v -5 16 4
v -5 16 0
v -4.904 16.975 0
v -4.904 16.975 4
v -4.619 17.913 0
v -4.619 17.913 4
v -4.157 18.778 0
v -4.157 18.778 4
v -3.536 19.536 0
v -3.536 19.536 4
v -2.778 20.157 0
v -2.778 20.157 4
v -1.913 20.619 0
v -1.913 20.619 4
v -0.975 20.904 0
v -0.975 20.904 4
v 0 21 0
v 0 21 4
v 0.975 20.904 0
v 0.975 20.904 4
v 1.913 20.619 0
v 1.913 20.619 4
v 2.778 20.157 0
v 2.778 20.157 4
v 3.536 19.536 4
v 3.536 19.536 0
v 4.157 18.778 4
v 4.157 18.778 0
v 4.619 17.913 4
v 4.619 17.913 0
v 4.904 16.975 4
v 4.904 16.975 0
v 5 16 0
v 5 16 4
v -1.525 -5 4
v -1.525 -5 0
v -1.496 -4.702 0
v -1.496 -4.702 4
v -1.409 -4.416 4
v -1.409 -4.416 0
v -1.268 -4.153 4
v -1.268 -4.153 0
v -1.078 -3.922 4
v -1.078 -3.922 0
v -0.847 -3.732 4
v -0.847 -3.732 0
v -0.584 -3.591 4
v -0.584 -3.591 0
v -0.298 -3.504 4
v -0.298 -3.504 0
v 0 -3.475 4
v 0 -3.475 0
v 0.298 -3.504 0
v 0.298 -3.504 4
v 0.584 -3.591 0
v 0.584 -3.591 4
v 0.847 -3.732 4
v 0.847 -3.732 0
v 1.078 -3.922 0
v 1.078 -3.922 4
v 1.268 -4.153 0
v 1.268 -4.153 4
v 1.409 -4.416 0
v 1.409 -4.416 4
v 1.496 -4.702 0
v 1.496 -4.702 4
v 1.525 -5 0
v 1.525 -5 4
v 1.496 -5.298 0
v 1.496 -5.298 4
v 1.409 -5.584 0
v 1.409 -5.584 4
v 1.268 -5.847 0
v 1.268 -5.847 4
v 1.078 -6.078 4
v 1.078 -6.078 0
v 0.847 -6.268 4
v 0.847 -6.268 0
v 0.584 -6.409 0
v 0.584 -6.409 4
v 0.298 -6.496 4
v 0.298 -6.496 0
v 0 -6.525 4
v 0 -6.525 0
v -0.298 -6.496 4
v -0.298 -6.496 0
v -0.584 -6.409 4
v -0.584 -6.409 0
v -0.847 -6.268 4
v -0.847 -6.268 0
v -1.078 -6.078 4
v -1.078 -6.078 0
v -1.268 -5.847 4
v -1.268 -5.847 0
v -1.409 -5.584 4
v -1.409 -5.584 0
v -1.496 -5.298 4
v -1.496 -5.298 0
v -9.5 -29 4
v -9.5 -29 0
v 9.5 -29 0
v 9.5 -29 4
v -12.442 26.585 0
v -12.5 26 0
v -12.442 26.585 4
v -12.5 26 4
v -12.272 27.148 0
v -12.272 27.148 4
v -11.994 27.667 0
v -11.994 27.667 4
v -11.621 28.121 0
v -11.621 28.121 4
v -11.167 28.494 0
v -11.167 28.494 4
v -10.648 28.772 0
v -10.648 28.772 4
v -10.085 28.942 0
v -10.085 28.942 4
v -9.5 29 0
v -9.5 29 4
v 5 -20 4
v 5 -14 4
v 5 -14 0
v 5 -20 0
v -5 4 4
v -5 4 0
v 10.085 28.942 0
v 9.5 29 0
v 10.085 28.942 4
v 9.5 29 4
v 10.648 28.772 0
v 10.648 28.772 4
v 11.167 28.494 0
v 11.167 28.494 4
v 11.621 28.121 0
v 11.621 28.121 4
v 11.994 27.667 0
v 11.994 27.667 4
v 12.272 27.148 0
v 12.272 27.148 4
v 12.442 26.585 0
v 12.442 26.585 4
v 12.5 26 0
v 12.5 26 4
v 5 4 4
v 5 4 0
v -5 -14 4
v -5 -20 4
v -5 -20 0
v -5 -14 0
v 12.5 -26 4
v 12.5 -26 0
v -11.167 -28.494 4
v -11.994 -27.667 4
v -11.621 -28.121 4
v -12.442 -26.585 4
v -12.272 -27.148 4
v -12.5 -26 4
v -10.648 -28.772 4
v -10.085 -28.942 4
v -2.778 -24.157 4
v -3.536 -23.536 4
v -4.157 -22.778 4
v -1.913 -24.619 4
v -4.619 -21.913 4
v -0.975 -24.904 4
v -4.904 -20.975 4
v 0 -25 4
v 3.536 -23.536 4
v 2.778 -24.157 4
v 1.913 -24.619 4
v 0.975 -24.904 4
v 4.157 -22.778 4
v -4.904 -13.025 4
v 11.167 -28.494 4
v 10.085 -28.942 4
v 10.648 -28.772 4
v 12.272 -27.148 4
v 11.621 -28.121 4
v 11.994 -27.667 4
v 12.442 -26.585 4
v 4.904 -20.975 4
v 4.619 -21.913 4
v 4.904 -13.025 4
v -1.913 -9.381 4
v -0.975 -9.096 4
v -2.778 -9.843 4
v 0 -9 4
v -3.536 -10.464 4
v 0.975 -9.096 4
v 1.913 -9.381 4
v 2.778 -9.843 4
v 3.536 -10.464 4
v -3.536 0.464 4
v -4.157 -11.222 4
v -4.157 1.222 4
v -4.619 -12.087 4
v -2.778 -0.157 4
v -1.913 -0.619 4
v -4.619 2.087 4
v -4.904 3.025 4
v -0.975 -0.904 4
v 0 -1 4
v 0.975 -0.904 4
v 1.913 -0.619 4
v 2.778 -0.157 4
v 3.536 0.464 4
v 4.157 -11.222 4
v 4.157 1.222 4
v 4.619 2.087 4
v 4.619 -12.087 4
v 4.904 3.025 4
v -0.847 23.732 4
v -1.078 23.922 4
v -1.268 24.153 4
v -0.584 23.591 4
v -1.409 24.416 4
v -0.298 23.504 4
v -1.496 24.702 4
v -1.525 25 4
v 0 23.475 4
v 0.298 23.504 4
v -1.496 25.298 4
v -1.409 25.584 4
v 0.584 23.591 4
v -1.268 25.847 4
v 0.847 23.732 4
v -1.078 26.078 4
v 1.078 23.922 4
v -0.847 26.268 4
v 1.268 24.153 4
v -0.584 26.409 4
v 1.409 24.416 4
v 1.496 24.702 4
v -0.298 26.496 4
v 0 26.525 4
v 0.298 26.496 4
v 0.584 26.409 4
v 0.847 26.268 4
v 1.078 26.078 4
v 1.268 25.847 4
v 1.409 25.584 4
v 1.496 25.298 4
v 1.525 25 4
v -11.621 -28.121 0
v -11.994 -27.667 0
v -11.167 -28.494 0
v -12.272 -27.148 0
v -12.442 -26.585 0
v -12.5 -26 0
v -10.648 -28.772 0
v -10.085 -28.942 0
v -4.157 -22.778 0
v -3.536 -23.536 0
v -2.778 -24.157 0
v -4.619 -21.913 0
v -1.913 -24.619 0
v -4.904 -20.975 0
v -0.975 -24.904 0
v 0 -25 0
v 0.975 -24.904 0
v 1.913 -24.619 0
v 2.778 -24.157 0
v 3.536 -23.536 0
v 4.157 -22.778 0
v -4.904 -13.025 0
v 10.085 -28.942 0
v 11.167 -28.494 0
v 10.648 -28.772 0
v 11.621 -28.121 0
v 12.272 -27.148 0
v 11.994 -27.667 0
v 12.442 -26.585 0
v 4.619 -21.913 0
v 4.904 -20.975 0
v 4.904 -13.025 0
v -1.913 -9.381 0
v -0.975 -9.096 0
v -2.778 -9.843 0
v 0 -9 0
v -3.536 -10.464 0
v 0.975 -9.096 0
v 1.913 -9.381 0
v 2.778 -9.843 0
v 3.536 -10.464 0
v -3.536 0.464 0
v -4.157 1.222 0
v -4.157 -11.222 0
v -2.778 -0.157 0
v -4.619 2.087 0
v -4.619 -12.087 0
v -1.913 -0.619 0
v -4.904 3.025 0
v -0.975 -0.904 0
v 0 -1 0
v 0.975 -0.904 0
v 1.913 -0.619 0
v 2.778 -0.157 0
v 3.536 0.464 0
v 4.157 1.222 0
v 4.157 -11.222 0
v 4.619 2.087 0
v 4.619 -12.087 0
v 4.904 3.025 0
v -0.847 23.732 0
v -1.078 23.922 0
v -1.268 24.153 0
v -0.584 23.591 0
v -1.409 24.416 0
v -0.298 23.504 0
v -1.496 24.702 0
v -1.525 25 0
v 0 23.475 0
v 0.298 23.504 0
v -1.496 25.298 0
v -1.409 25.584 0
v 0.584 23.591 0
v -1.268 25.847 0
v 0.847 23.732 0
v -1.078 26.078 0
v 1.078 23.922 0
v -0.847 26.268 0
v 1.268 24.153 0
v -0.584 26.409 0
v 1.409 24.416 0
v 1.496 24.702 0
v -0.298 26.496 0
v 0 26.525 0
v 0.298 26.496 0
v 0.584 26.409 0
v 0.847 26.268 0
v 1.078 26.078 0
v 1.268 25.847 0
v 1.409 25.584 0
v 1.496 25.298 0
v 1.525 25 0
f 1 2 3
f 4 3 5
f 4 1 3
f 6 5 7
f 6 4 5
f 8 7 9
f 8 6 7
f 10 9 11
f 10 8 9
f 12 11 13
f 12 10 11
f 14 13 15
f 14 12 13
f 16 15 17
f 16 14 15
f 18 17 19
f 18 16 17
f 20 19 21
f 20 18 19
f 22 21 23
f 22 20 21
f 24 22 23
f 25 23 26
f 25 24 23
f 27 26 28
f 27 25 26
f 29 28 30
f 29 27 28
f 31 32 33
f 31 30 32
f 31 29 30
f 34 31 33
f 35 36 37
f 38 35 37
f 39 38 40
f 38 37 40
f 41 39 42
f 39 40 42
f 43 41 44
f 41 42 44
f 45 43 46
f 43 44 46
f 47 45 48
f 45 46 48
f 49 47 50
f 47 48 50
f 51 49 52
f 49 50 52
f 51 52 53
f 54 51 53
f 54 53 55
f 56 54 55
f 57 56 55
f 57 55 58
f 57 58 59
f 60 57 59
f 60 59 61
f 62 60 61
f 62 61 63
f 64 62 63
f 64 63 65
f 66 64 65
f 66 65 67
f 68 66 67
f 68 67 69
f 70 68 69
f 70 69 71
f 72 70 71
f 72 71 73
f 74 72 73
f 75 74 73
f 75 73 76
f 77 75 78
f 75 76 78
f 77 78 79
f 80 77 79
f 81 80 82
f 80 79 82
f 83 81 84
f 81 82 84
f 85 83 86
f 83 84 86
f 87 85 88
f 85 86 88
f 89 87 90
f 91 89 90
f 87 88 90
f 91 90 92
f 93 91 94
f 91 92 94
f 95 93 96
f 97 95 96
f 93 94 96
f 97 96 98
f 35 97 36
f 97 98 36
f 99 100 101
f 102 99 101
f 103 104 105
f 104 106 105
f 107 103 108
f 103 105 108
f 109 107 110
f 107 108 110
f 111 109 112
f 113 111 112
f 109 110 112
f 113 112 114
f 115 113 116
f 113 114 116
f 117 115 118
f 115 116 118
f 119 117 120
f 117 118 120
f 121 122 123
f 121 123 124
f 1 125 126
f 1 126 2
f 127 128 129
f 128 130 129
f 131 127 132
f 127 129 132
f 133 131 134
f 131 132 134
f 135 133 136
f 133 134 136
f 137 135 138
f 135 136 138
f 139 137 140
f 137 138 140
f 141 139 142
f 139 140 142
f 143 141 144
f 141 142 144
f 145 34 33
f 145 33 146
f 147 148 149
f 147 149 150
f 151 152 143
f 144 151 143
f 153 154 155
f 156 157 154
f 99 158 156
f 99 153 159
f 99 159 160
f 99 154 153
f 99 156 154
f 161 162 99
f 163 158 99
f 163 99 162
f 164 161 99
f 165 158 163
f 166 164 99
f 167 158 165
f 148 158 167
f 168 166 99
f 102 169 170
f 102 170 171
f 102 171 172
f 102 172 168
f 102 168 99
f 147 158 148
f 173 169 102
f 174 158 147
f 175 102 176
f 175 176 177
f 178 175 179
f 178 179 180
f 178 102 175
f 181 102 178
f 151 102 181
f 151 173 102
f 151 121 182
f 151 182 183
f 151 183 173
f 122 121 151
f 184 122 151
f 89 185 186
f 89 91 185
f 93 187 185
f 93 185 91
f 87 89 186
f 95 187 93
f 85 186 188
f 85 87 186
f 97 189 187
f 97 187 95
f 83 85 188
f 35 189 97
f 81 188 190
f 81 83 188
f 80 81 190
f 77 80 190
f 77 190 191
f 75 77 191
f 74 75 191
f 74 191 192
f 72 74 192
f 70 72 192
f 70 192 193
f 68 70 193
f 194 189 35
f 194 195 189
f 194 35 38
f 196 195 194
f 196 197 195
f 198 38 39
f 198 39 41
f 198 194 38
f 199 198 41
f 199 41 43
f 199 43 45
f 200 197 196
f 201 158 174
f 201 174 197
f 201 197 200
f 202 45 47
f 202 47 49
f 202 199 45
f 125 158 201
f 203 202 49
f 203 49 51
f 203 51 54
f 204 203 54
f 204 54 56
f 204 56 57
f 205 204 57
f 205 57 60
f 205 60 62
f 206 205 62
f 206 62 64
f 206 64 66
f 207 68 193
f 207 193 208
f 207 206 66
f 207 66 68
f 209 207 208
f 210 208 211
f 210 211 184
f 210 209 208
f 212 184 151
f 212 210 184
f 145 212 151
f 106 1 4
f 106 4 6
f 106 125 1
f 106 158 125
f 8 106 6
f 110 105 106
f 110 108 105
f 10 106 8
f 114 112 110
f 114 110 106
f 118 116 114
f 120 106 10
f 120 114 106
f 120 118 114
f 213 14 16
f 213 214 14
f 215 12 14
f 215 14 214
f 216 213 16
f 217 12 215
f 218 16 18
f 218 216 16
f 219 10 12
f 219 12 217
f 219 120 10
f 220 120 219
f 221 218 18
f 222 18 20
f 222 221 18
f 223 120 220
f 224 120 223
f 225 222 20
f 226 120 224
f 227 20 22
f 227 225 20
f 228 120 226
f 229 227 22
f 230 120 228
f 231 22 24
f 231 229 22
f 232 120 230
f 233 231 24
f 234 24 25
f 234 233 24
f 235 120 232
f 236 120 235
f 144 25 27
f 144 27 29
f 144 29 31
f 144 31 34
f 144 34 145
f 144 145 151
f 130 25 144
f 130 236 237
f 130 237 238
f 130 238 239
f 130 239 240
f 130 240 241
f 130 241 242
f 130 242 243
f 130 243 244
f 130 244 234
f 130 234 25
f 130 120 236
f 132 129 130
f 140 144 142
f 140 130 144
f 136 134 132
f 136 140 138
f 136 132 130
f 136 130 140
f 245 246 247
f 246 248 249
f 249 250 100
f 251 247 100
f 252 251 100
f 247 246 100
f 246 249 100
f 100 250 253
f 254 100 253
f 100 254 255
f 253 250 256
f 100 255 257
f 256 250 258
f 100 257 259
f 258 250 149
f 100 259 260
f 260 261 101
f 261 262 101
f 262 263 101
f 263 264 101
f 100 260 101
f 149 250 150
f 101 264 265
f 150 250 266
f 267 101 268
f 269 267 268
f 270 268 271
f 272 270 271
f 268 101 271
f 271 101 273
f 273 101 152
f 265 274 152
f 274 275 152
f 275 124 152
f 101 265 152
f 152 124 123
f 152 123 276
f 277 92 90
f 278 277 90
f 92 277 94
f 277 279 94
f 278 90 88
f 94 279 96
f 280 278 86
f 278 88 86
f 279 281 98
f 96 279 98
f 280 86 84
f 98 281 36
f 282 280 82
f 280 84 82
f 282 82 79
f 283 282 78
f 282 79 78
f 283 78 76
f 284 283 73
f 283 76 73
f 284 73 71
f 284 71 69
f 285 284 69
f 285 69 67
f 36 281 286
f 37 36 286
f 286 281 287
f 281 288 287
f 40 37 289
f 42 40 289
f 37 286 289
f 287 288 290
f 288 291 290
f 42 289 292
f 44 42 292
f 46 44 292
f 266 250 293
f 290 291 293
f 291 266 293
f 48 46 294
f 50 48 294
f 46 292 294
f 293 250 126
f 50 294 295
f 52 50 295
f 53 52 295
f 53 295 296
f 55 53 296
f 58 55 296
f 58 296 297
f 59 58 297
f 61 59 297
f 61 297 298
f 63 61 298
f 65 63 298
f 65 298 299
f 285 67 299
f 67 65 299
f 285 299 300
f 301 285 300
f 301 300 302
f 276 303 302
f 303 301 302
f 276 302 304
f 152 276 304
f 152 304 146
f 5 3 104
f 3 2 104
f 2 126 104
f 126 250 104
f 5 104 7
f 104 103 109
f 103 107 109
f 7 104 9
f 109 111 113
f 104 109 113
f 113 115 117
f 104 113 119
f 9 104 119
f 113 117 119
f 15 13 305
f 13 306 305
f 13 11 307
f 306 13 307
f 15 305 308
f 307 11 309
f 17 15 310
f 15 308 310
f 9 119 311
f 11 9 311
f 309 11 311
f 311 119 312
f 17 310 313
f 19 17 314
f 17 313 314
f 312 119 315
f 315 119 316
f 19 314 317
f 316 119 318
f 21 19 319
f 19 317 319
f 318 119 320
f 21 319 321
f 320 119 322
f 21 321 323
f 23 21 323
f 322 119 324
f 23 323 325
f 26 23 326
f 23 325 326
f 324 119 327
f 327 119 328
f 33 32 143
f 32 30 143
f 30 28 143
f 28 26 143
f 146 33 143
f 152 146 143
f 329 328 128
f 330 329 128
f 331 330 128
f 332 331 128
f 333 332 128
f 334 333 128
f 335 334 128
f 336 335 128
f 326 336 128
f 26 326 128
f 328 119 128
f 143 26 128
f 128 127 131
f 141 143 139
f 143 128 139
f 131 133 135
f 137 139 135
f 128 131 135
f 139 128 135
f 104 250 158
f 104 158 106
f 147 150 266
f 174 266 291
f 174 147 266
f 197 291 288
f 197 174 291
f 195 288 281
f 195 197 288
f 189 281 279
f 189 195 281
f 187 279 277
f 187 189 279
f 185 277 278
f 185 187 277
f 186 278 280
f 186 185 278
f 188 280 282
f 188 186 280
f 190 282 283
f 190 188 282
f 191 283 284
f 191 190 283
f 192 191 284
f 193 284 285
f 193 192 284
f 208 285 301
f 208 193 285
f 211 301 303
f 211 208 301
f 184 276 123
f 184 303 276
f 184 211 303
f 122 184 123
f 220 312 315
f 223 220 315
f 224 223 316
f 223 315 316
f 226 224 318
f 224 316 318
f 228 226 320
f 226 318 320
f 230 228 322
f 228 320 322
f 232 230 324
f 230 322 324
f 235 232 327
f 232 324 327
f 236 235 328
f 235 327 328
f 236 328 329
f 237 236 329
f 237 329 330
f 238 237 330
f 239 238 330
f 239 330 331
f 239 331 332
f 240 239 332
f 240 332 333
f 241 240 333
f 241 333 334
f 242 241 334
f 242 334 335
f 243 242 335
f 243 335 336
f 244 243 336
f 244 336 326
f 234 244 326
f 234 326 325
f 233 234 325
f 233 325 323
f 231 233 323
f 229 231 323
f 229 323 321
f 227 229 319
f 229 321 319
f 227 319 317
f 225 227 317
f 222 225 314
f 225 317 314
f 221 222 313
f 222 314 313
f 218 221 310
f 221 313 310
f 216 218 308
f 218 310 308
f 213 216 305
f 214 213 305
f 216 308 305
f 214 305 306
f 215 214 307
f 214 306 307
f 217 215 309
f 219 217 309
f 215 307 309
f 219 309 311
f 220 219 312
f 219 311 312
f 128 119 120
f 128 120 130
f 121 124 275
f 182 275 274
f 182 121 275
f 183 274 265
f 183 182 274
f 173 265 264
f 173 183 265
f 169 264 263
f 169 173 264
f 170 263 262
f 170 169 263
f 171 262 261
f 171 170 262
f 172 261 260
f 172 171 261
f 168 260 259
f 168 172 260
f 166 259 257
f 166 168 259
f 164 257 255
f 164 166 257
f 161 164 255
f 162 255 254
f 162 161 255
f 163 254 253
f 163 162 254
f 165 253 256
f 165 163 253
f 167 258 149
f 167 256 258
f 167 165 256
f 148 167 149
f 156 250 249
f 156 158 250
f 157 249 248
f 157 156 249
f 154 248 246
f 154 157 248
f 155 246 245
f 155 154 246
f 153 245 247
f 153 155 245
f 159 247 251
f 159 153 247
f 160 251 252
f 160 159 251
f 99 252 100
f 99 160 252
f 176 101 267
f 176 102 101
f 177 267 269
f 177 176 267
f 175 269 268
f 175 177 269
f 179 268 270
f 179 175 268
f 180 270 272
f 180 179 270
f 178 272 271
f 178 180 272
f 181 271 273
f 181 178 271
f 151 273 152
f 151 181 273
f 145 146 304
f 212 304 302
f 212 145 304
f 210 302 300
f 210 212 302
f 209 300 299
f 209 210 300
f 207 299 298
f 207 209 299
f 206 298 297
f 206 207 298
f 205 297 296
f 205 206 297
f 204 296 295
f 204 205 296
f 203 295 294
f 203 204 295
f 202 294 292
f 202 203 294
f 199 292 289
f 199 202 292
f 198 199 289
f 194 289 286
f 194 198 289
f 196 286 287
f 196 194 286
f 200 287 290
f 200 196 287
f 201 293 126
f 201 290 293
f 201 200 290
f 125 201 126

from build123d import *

# Parameters (mm, degrees)
SKETCH_1_W               = 25
SKETCH_1_H               = 58
EXTRUDE_1_DEPTH          = 4
SKETCH_2_R               = 1.525
CUT_EXTRUDE_1_DEPTH      = 1
CUT_EXTRUDE_1_DEPTH_BACK = 5
FILLET_1_R               = 3
CUT_EXTRUDE_2_DEPTH      = 1
CUT_EXTRUDE_2_DEPTH_BACK = 5


with BuildPart() as part:
    # 草图1 → 凸台-拉伸1 (new body)
    with BuildSketch(Plane.XY):
        Rectangle(SKETCH_1_W, SKETCH_1_H)
    extrude(amount=EXTRUDE_1_DEPTH)

    # 草图2 → 切除-拉伸1 (cut, two sides)
    with BuildSketch(Plane(origin=(0, 0, 0), x_dir=(-1, 0, 0), z_dir=(0, 0, -1))) as cut_extrude_1_sk:
        with Locations((0, 24.999999999)):
            Circle(SKETCH_2_R)
        with Locations((0, -5.000000001)):
            Circle(SKETCH_2_R)
    extrude(amount=CUT_EXTRUDE_1_DEPTH, mode=Mode.SUBTRACT)
    extrude(cut_extrude_1_sk.sketch, amount=-CUT_EXTRUDE_1_DEPTH_BACK, mode=Mode.SUBTRACT)

    # 圆角1
    fillet_1_edges = [part.edges().sort_by_distance(p)[0] for p in [
        (12.5, -29, 2),
        (-12.5, -29, 2),
        (-12.5, 29, 2),
        (12.5, 29, 2),
    ]]
    fillet(fillet_1_edges, radius=FILLET_1_R)

    # 草图3 → 切除-拉伸2 (cut, two sides)
    with BuildSketch(Plane.XY.offset(4)) as cut_extrude_2_sk:
        with BuildLine():
            Line((5, 15.999999999), (5, 3.999999999))
            ThreePointArc((5, 3.999999999), (0, -1.000000001), (-5, 3.999999999))
            Line((-5, 3.999999999), (-5, 15.999999999))
            ThreePointArc((-5, 15.999999999), (0, 20.999999999), (5, 15.999999999))
        make_face()
        with BuildLine():
            Line((5, -14), (5, -20))
            ThreePointArc((5, -20), (0, -25), (-5, -20))
            Line((-5, -20), (-5, -14))
            ThreePointArc((-5, -14), (0, -9), (5, -14))
        make_face()
    extrude(amount=CUT_EXTRUDE_2_DEPTH, mode=Mode.SUBTRACT)
    extrude(cut_extrude_2_sk.sketch, amount=-CUT_EXTRUDE_2_DEPTH_BACK, mode=Mode.SUBTRACT)


solid = part.part
